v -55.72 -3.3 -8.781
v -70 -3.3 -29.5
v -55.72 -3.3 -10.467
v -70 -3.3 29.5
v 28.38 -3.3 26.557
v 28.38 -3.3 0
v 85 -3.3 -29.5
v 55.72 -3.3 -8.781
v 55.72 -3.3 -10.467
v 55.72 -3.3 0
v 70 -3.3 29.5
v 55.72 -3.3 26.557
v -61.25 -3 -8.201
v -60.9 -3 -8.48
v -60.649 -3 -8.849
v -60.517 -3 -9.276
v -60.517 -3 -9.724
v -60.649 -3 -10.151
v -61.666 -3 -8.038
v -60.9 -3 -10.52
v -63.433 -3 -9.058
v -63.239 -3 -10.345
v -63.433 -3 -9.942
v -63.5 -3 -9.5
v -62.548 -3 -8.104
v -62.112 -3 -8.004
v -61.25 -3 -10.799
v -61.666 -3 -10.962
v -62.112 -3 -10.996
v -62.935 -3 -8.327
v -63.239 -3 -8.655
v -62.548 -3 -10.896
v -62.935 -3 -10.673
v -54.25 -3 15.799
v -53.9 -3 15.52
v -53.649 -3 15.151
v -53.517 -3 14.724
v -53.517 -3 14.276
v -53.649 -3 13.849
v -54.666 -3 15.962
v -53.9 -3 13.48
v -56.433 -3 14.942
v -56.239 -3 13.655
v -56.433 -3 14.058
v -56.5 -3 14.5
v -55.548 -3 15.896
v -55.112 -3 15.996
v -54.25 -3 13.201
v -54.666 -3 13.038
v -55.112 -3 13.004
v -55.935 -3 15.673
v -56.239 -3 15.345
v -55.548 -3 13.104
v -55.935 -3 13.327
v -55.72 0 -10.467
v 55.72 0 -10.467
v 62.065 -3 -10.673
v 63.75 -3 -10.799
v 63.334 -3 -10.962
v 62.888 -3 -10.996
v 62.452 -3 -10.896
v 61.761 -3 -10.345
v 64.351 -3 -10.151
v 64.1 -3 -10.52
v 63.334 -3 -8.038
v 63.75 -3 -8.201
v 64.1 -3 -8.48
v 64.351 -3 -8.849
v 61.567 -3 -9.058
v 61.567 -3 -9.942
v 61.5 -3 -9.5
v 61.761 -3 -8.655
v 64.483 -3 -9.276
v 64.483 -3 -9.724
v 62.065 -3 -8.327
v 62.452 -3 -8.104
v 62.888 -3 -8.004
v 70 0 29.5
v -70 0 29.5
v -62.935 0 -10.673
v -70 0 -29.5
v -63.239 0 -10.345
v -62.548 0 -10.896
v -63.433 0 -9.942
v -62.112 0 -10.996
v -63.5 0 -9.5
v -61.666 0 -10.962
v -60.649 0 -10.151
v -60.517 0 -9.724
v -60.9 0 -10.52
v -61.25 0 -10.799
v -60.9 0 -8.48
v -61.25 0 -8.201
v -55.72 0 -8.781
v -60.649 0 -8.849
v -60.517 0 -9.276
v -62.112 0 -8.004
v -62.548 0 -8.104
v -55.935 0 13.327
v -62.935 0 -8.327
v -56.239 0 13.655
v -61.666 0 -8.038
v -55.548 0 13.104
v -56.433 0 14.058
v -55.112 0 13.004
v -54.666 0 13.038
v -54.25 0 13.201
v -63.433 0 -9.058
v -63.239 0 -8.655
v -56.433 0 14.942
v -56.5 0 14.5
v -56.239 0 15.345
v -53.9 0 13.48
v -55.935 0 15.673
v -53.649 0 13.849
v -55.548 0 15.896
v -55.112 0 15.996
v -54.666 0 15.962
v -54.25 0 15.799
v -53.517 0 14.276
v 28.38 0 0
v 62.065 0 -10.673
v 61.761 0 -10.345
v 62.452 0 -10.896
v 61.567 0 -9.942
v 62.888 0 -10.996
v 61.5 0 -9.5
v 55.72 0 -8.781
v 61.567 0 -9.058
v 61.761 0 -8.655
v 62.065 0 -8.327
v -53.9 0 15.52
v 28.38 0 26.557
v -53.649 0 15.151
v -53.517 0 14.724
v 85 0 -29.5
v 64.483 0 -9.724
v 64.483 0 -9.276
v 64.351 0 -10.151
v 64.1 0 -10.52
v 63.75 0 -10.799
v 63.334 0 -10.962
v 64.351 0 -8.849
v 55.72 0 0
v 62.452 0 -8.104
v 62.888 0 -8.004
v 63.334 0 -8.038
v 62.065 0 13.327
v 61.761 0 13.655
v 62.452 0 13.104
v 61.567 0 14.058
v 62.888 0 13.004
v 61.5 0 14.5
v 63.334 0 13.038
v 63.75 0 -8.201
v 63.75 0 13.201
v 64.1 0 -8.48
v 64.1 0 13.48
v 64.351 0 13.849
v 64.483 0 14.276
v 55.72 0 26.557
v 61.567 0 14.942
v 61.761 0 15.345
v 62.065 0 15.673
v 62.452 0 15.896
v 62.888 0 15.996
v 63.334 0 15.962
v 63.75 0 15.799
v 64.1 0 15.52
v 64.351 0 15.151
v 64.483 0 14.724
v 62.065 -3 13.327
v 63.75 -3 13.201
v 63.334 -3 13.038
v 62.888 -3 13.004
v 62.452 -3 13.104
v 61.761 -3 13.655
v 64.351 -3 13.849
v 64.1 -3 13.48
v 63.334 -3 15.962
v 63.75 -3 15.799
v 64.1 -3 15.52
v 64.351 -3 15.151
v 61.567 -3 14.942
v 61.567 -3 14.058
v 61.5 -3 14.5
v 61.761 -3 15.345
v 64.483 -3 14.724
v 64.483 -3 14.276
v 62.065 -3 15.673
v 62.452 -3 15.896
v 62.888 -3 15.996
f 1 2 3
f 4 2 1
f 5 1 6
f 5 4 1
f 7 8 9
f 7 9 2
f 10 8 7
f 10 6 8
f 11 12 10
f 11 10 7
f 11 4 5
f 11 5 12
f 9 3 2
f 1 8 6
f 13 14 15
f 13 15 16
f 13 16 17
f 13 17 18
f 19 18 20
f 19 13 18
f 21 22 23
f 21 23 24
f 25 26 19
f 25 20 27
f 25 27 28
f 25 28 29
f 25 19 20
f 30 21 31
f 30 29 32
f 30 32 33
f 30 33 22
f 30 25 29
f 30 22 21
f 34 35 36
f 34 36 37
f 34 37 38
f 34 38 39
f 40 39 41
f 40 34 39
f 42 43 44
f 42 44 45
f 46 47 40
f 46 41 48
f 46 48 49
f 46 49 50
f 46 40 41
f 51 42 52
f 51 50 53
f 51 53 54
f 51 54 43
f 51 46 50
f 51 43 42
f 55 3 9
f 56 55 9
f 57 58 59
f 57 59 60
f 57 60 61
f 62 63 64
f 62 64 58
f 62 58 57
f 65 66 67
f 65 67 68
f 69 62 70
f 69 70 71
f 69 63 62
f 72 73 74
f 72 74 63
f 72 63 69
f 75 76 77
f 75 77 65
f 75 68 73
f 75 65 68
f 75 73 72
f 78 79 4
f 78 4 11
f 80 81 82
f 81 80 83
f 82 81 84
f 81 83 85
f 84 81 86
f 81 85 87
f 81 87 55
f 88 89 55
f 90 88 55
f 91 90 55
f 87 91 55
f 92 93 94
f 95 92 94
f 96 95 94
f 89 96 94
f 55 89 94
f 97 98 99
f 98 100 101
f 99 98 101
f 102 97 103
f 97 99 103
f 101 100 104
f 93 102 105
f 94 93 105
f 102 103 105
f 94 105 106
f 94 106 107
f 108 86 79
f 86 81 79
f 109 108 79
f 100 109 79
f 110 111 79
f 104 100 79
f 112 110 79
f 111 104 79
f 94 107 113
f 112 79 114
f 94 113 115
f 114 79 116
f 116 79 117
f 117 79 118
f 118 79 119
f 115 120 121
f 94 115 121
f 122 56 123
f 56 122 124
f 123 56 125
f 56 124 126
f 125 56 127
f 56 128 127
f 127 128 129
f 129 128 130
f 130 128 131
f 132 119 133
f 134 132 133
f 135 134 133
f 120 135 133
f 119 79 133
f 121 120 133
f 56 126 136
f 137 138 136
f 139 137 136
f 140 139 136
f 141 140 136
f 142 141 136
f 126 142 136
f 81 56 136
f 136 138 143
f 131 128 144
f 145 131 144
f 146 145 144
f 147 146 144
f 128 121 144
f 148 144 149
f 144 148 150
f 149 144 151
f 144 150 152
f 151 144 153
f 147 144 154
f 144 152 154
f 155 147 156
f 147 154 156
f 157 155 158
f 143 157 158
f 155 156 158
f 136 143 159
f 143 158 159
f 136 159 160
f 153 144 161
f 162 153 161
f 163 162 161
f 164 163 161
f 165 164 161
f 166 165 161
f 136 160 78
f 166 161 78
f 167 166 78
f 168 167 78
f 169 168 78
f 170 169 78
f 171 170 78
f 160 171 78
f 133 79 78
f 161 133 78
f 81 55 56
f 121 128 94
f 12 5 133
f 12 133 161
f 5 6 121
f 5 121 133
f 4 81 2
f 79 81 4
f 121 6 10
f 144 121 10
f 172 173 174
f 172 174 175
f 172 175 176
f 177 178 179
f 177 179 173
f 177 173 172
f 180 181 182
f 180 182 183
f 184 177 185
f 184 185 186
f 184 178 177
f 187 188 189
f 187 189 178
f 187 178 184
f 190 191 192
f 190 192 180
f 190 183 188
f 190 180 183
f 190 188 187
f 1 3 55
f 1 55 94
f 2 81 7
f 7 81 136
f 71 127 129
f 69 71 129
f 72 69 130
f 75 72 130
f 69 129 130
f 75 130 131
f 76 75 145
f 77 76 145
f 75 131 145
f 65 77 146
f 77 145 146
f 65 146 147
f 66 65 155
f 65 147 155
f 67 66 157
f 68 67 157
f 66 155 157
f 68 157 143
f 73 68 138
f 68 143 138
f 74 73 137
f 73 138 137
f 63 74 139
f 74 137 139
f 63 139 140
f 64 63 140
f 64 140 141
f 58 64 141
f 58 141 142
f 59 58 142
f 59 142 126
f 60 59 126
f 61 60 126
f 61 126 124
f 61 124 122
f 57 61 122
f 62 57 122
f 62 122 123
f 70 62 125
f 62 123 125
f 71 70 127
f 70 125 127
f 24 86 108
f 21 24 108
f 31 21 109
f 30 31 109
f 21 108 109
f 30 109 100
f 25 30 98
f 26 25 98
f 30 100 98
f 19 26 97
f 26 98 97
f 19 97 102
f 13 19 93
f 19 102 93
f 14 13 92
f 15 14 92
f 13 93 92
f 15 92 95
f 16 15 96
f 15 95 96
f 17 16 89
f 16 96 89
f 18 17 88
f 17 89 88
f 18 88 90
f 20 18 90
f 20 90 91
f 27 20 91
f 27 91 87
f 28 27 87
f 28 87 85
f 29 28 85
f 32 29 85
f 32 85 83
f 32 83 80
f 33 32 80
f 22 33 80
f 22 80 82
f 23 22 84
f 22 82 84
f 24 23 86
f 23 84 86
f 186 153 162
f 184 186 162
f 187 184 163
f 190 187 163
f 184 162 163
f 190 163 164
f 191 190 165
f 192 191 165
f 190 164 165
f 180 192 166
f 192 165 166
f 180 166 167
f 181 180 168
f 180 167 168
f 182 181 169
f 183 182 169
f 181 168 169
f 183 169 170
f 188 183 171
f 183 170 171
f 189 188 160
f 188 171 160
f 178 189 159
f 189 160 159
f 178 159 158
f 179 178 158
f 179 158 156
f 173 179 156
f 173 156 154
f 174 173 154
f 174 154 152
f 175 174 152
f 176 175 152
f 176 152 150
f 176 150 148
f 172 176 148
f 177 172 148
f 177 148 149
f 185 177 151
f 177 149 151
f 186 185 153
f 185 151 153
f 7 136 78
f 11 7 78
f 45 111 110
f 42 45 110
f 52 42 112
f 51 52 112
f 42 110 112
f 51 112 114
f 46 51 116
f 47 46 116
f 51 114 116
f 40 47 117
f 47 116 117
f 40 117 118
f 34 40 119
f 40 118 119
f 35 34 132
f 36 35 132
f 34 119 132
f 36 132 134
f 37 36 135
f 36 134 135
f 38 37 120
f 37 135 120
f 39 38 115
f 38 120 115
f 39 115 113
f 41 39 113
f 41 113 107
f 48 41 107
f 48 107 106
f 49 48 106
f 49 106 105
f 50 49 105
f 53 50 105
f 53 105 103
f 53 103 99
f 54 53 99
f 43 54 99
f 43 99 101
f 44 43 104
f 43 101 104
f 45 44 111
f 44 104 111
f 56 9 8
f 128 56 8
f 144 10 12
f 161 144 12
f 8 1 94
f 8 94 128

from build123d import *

# Parameters (mm, degrees)
F0_W     = 140
F0_H     = 59
F1_DEPTH = 3.3
F2_W     = 111.440674
F2_H     = 1.685995
F3_DEPTH = 25
F4_W     = 27.34
F4_H     = 19
F5_DEPTH = 25
F6_W     = 27.34
F6_H     = 26.557377
F7_DEPTH = 25
F8_R     = 1.5
F9_DEPTH = 3


with BuildPart() as f1:
    # F0 (on Front) → F1 (new body)
    with BuildSketch(Plane.XZ):
        Rectangle(F0_W, F0_H)
        Polygon((85, -29.5), (70, 29.5), (70, -29.5), align=None)
    extrude(amount=F1_DEPTH)

    # F2 (on face) → F3 (cut)
    with BuildSketch(Plane.XZ.offset(3.3)):
        with Locations((0, -9.62422)):
            Rectangle(F2_W, F2_H)
    extrude(amount=-F3_DEPTH, mode=Mode.SUBTRACT)

    # F4 (on face) → F5 (cut)
    with BuildSketch(Plane.XZ.offset(3.3)):
        with Locations((42.050337, 12.718777)):
            Rectangle(F4_W, F4_H)
    extrude(amount=-F5_DEPTH, mode=Mode.SUBTRACT)

    # F6 (on face) → F7 (cut)
    with BuildSketch(Plane.XZ.offset(3.3)):
        with Locations((42.050337, 13.278688)):
            Rectangle(F6_W, F6_H)
    extrude(amount=-F7_DEPTH, mode=Mode.SUBTRACT)

    # F8 (on face) → F9 (cut)
    with BuildSketch(Plane(origin=(0, 0, 0), x_dir=(-1, 0, 0), z_dir=(0, 1, 0))):
        with Locations((55, 14.5)):
            Circle(F8_R)
        with Locations((62, -9.5)):
            Circle(F8_R)
        with Locations((-63, -9.5)):
            Circle(F8_R)
        with Locations((-63, 14.5)):
            Circle(F8_R)
    extrude(amount=-F9_DEPTH, mode=Mode.SUBTRACT)


solid = f1.part
